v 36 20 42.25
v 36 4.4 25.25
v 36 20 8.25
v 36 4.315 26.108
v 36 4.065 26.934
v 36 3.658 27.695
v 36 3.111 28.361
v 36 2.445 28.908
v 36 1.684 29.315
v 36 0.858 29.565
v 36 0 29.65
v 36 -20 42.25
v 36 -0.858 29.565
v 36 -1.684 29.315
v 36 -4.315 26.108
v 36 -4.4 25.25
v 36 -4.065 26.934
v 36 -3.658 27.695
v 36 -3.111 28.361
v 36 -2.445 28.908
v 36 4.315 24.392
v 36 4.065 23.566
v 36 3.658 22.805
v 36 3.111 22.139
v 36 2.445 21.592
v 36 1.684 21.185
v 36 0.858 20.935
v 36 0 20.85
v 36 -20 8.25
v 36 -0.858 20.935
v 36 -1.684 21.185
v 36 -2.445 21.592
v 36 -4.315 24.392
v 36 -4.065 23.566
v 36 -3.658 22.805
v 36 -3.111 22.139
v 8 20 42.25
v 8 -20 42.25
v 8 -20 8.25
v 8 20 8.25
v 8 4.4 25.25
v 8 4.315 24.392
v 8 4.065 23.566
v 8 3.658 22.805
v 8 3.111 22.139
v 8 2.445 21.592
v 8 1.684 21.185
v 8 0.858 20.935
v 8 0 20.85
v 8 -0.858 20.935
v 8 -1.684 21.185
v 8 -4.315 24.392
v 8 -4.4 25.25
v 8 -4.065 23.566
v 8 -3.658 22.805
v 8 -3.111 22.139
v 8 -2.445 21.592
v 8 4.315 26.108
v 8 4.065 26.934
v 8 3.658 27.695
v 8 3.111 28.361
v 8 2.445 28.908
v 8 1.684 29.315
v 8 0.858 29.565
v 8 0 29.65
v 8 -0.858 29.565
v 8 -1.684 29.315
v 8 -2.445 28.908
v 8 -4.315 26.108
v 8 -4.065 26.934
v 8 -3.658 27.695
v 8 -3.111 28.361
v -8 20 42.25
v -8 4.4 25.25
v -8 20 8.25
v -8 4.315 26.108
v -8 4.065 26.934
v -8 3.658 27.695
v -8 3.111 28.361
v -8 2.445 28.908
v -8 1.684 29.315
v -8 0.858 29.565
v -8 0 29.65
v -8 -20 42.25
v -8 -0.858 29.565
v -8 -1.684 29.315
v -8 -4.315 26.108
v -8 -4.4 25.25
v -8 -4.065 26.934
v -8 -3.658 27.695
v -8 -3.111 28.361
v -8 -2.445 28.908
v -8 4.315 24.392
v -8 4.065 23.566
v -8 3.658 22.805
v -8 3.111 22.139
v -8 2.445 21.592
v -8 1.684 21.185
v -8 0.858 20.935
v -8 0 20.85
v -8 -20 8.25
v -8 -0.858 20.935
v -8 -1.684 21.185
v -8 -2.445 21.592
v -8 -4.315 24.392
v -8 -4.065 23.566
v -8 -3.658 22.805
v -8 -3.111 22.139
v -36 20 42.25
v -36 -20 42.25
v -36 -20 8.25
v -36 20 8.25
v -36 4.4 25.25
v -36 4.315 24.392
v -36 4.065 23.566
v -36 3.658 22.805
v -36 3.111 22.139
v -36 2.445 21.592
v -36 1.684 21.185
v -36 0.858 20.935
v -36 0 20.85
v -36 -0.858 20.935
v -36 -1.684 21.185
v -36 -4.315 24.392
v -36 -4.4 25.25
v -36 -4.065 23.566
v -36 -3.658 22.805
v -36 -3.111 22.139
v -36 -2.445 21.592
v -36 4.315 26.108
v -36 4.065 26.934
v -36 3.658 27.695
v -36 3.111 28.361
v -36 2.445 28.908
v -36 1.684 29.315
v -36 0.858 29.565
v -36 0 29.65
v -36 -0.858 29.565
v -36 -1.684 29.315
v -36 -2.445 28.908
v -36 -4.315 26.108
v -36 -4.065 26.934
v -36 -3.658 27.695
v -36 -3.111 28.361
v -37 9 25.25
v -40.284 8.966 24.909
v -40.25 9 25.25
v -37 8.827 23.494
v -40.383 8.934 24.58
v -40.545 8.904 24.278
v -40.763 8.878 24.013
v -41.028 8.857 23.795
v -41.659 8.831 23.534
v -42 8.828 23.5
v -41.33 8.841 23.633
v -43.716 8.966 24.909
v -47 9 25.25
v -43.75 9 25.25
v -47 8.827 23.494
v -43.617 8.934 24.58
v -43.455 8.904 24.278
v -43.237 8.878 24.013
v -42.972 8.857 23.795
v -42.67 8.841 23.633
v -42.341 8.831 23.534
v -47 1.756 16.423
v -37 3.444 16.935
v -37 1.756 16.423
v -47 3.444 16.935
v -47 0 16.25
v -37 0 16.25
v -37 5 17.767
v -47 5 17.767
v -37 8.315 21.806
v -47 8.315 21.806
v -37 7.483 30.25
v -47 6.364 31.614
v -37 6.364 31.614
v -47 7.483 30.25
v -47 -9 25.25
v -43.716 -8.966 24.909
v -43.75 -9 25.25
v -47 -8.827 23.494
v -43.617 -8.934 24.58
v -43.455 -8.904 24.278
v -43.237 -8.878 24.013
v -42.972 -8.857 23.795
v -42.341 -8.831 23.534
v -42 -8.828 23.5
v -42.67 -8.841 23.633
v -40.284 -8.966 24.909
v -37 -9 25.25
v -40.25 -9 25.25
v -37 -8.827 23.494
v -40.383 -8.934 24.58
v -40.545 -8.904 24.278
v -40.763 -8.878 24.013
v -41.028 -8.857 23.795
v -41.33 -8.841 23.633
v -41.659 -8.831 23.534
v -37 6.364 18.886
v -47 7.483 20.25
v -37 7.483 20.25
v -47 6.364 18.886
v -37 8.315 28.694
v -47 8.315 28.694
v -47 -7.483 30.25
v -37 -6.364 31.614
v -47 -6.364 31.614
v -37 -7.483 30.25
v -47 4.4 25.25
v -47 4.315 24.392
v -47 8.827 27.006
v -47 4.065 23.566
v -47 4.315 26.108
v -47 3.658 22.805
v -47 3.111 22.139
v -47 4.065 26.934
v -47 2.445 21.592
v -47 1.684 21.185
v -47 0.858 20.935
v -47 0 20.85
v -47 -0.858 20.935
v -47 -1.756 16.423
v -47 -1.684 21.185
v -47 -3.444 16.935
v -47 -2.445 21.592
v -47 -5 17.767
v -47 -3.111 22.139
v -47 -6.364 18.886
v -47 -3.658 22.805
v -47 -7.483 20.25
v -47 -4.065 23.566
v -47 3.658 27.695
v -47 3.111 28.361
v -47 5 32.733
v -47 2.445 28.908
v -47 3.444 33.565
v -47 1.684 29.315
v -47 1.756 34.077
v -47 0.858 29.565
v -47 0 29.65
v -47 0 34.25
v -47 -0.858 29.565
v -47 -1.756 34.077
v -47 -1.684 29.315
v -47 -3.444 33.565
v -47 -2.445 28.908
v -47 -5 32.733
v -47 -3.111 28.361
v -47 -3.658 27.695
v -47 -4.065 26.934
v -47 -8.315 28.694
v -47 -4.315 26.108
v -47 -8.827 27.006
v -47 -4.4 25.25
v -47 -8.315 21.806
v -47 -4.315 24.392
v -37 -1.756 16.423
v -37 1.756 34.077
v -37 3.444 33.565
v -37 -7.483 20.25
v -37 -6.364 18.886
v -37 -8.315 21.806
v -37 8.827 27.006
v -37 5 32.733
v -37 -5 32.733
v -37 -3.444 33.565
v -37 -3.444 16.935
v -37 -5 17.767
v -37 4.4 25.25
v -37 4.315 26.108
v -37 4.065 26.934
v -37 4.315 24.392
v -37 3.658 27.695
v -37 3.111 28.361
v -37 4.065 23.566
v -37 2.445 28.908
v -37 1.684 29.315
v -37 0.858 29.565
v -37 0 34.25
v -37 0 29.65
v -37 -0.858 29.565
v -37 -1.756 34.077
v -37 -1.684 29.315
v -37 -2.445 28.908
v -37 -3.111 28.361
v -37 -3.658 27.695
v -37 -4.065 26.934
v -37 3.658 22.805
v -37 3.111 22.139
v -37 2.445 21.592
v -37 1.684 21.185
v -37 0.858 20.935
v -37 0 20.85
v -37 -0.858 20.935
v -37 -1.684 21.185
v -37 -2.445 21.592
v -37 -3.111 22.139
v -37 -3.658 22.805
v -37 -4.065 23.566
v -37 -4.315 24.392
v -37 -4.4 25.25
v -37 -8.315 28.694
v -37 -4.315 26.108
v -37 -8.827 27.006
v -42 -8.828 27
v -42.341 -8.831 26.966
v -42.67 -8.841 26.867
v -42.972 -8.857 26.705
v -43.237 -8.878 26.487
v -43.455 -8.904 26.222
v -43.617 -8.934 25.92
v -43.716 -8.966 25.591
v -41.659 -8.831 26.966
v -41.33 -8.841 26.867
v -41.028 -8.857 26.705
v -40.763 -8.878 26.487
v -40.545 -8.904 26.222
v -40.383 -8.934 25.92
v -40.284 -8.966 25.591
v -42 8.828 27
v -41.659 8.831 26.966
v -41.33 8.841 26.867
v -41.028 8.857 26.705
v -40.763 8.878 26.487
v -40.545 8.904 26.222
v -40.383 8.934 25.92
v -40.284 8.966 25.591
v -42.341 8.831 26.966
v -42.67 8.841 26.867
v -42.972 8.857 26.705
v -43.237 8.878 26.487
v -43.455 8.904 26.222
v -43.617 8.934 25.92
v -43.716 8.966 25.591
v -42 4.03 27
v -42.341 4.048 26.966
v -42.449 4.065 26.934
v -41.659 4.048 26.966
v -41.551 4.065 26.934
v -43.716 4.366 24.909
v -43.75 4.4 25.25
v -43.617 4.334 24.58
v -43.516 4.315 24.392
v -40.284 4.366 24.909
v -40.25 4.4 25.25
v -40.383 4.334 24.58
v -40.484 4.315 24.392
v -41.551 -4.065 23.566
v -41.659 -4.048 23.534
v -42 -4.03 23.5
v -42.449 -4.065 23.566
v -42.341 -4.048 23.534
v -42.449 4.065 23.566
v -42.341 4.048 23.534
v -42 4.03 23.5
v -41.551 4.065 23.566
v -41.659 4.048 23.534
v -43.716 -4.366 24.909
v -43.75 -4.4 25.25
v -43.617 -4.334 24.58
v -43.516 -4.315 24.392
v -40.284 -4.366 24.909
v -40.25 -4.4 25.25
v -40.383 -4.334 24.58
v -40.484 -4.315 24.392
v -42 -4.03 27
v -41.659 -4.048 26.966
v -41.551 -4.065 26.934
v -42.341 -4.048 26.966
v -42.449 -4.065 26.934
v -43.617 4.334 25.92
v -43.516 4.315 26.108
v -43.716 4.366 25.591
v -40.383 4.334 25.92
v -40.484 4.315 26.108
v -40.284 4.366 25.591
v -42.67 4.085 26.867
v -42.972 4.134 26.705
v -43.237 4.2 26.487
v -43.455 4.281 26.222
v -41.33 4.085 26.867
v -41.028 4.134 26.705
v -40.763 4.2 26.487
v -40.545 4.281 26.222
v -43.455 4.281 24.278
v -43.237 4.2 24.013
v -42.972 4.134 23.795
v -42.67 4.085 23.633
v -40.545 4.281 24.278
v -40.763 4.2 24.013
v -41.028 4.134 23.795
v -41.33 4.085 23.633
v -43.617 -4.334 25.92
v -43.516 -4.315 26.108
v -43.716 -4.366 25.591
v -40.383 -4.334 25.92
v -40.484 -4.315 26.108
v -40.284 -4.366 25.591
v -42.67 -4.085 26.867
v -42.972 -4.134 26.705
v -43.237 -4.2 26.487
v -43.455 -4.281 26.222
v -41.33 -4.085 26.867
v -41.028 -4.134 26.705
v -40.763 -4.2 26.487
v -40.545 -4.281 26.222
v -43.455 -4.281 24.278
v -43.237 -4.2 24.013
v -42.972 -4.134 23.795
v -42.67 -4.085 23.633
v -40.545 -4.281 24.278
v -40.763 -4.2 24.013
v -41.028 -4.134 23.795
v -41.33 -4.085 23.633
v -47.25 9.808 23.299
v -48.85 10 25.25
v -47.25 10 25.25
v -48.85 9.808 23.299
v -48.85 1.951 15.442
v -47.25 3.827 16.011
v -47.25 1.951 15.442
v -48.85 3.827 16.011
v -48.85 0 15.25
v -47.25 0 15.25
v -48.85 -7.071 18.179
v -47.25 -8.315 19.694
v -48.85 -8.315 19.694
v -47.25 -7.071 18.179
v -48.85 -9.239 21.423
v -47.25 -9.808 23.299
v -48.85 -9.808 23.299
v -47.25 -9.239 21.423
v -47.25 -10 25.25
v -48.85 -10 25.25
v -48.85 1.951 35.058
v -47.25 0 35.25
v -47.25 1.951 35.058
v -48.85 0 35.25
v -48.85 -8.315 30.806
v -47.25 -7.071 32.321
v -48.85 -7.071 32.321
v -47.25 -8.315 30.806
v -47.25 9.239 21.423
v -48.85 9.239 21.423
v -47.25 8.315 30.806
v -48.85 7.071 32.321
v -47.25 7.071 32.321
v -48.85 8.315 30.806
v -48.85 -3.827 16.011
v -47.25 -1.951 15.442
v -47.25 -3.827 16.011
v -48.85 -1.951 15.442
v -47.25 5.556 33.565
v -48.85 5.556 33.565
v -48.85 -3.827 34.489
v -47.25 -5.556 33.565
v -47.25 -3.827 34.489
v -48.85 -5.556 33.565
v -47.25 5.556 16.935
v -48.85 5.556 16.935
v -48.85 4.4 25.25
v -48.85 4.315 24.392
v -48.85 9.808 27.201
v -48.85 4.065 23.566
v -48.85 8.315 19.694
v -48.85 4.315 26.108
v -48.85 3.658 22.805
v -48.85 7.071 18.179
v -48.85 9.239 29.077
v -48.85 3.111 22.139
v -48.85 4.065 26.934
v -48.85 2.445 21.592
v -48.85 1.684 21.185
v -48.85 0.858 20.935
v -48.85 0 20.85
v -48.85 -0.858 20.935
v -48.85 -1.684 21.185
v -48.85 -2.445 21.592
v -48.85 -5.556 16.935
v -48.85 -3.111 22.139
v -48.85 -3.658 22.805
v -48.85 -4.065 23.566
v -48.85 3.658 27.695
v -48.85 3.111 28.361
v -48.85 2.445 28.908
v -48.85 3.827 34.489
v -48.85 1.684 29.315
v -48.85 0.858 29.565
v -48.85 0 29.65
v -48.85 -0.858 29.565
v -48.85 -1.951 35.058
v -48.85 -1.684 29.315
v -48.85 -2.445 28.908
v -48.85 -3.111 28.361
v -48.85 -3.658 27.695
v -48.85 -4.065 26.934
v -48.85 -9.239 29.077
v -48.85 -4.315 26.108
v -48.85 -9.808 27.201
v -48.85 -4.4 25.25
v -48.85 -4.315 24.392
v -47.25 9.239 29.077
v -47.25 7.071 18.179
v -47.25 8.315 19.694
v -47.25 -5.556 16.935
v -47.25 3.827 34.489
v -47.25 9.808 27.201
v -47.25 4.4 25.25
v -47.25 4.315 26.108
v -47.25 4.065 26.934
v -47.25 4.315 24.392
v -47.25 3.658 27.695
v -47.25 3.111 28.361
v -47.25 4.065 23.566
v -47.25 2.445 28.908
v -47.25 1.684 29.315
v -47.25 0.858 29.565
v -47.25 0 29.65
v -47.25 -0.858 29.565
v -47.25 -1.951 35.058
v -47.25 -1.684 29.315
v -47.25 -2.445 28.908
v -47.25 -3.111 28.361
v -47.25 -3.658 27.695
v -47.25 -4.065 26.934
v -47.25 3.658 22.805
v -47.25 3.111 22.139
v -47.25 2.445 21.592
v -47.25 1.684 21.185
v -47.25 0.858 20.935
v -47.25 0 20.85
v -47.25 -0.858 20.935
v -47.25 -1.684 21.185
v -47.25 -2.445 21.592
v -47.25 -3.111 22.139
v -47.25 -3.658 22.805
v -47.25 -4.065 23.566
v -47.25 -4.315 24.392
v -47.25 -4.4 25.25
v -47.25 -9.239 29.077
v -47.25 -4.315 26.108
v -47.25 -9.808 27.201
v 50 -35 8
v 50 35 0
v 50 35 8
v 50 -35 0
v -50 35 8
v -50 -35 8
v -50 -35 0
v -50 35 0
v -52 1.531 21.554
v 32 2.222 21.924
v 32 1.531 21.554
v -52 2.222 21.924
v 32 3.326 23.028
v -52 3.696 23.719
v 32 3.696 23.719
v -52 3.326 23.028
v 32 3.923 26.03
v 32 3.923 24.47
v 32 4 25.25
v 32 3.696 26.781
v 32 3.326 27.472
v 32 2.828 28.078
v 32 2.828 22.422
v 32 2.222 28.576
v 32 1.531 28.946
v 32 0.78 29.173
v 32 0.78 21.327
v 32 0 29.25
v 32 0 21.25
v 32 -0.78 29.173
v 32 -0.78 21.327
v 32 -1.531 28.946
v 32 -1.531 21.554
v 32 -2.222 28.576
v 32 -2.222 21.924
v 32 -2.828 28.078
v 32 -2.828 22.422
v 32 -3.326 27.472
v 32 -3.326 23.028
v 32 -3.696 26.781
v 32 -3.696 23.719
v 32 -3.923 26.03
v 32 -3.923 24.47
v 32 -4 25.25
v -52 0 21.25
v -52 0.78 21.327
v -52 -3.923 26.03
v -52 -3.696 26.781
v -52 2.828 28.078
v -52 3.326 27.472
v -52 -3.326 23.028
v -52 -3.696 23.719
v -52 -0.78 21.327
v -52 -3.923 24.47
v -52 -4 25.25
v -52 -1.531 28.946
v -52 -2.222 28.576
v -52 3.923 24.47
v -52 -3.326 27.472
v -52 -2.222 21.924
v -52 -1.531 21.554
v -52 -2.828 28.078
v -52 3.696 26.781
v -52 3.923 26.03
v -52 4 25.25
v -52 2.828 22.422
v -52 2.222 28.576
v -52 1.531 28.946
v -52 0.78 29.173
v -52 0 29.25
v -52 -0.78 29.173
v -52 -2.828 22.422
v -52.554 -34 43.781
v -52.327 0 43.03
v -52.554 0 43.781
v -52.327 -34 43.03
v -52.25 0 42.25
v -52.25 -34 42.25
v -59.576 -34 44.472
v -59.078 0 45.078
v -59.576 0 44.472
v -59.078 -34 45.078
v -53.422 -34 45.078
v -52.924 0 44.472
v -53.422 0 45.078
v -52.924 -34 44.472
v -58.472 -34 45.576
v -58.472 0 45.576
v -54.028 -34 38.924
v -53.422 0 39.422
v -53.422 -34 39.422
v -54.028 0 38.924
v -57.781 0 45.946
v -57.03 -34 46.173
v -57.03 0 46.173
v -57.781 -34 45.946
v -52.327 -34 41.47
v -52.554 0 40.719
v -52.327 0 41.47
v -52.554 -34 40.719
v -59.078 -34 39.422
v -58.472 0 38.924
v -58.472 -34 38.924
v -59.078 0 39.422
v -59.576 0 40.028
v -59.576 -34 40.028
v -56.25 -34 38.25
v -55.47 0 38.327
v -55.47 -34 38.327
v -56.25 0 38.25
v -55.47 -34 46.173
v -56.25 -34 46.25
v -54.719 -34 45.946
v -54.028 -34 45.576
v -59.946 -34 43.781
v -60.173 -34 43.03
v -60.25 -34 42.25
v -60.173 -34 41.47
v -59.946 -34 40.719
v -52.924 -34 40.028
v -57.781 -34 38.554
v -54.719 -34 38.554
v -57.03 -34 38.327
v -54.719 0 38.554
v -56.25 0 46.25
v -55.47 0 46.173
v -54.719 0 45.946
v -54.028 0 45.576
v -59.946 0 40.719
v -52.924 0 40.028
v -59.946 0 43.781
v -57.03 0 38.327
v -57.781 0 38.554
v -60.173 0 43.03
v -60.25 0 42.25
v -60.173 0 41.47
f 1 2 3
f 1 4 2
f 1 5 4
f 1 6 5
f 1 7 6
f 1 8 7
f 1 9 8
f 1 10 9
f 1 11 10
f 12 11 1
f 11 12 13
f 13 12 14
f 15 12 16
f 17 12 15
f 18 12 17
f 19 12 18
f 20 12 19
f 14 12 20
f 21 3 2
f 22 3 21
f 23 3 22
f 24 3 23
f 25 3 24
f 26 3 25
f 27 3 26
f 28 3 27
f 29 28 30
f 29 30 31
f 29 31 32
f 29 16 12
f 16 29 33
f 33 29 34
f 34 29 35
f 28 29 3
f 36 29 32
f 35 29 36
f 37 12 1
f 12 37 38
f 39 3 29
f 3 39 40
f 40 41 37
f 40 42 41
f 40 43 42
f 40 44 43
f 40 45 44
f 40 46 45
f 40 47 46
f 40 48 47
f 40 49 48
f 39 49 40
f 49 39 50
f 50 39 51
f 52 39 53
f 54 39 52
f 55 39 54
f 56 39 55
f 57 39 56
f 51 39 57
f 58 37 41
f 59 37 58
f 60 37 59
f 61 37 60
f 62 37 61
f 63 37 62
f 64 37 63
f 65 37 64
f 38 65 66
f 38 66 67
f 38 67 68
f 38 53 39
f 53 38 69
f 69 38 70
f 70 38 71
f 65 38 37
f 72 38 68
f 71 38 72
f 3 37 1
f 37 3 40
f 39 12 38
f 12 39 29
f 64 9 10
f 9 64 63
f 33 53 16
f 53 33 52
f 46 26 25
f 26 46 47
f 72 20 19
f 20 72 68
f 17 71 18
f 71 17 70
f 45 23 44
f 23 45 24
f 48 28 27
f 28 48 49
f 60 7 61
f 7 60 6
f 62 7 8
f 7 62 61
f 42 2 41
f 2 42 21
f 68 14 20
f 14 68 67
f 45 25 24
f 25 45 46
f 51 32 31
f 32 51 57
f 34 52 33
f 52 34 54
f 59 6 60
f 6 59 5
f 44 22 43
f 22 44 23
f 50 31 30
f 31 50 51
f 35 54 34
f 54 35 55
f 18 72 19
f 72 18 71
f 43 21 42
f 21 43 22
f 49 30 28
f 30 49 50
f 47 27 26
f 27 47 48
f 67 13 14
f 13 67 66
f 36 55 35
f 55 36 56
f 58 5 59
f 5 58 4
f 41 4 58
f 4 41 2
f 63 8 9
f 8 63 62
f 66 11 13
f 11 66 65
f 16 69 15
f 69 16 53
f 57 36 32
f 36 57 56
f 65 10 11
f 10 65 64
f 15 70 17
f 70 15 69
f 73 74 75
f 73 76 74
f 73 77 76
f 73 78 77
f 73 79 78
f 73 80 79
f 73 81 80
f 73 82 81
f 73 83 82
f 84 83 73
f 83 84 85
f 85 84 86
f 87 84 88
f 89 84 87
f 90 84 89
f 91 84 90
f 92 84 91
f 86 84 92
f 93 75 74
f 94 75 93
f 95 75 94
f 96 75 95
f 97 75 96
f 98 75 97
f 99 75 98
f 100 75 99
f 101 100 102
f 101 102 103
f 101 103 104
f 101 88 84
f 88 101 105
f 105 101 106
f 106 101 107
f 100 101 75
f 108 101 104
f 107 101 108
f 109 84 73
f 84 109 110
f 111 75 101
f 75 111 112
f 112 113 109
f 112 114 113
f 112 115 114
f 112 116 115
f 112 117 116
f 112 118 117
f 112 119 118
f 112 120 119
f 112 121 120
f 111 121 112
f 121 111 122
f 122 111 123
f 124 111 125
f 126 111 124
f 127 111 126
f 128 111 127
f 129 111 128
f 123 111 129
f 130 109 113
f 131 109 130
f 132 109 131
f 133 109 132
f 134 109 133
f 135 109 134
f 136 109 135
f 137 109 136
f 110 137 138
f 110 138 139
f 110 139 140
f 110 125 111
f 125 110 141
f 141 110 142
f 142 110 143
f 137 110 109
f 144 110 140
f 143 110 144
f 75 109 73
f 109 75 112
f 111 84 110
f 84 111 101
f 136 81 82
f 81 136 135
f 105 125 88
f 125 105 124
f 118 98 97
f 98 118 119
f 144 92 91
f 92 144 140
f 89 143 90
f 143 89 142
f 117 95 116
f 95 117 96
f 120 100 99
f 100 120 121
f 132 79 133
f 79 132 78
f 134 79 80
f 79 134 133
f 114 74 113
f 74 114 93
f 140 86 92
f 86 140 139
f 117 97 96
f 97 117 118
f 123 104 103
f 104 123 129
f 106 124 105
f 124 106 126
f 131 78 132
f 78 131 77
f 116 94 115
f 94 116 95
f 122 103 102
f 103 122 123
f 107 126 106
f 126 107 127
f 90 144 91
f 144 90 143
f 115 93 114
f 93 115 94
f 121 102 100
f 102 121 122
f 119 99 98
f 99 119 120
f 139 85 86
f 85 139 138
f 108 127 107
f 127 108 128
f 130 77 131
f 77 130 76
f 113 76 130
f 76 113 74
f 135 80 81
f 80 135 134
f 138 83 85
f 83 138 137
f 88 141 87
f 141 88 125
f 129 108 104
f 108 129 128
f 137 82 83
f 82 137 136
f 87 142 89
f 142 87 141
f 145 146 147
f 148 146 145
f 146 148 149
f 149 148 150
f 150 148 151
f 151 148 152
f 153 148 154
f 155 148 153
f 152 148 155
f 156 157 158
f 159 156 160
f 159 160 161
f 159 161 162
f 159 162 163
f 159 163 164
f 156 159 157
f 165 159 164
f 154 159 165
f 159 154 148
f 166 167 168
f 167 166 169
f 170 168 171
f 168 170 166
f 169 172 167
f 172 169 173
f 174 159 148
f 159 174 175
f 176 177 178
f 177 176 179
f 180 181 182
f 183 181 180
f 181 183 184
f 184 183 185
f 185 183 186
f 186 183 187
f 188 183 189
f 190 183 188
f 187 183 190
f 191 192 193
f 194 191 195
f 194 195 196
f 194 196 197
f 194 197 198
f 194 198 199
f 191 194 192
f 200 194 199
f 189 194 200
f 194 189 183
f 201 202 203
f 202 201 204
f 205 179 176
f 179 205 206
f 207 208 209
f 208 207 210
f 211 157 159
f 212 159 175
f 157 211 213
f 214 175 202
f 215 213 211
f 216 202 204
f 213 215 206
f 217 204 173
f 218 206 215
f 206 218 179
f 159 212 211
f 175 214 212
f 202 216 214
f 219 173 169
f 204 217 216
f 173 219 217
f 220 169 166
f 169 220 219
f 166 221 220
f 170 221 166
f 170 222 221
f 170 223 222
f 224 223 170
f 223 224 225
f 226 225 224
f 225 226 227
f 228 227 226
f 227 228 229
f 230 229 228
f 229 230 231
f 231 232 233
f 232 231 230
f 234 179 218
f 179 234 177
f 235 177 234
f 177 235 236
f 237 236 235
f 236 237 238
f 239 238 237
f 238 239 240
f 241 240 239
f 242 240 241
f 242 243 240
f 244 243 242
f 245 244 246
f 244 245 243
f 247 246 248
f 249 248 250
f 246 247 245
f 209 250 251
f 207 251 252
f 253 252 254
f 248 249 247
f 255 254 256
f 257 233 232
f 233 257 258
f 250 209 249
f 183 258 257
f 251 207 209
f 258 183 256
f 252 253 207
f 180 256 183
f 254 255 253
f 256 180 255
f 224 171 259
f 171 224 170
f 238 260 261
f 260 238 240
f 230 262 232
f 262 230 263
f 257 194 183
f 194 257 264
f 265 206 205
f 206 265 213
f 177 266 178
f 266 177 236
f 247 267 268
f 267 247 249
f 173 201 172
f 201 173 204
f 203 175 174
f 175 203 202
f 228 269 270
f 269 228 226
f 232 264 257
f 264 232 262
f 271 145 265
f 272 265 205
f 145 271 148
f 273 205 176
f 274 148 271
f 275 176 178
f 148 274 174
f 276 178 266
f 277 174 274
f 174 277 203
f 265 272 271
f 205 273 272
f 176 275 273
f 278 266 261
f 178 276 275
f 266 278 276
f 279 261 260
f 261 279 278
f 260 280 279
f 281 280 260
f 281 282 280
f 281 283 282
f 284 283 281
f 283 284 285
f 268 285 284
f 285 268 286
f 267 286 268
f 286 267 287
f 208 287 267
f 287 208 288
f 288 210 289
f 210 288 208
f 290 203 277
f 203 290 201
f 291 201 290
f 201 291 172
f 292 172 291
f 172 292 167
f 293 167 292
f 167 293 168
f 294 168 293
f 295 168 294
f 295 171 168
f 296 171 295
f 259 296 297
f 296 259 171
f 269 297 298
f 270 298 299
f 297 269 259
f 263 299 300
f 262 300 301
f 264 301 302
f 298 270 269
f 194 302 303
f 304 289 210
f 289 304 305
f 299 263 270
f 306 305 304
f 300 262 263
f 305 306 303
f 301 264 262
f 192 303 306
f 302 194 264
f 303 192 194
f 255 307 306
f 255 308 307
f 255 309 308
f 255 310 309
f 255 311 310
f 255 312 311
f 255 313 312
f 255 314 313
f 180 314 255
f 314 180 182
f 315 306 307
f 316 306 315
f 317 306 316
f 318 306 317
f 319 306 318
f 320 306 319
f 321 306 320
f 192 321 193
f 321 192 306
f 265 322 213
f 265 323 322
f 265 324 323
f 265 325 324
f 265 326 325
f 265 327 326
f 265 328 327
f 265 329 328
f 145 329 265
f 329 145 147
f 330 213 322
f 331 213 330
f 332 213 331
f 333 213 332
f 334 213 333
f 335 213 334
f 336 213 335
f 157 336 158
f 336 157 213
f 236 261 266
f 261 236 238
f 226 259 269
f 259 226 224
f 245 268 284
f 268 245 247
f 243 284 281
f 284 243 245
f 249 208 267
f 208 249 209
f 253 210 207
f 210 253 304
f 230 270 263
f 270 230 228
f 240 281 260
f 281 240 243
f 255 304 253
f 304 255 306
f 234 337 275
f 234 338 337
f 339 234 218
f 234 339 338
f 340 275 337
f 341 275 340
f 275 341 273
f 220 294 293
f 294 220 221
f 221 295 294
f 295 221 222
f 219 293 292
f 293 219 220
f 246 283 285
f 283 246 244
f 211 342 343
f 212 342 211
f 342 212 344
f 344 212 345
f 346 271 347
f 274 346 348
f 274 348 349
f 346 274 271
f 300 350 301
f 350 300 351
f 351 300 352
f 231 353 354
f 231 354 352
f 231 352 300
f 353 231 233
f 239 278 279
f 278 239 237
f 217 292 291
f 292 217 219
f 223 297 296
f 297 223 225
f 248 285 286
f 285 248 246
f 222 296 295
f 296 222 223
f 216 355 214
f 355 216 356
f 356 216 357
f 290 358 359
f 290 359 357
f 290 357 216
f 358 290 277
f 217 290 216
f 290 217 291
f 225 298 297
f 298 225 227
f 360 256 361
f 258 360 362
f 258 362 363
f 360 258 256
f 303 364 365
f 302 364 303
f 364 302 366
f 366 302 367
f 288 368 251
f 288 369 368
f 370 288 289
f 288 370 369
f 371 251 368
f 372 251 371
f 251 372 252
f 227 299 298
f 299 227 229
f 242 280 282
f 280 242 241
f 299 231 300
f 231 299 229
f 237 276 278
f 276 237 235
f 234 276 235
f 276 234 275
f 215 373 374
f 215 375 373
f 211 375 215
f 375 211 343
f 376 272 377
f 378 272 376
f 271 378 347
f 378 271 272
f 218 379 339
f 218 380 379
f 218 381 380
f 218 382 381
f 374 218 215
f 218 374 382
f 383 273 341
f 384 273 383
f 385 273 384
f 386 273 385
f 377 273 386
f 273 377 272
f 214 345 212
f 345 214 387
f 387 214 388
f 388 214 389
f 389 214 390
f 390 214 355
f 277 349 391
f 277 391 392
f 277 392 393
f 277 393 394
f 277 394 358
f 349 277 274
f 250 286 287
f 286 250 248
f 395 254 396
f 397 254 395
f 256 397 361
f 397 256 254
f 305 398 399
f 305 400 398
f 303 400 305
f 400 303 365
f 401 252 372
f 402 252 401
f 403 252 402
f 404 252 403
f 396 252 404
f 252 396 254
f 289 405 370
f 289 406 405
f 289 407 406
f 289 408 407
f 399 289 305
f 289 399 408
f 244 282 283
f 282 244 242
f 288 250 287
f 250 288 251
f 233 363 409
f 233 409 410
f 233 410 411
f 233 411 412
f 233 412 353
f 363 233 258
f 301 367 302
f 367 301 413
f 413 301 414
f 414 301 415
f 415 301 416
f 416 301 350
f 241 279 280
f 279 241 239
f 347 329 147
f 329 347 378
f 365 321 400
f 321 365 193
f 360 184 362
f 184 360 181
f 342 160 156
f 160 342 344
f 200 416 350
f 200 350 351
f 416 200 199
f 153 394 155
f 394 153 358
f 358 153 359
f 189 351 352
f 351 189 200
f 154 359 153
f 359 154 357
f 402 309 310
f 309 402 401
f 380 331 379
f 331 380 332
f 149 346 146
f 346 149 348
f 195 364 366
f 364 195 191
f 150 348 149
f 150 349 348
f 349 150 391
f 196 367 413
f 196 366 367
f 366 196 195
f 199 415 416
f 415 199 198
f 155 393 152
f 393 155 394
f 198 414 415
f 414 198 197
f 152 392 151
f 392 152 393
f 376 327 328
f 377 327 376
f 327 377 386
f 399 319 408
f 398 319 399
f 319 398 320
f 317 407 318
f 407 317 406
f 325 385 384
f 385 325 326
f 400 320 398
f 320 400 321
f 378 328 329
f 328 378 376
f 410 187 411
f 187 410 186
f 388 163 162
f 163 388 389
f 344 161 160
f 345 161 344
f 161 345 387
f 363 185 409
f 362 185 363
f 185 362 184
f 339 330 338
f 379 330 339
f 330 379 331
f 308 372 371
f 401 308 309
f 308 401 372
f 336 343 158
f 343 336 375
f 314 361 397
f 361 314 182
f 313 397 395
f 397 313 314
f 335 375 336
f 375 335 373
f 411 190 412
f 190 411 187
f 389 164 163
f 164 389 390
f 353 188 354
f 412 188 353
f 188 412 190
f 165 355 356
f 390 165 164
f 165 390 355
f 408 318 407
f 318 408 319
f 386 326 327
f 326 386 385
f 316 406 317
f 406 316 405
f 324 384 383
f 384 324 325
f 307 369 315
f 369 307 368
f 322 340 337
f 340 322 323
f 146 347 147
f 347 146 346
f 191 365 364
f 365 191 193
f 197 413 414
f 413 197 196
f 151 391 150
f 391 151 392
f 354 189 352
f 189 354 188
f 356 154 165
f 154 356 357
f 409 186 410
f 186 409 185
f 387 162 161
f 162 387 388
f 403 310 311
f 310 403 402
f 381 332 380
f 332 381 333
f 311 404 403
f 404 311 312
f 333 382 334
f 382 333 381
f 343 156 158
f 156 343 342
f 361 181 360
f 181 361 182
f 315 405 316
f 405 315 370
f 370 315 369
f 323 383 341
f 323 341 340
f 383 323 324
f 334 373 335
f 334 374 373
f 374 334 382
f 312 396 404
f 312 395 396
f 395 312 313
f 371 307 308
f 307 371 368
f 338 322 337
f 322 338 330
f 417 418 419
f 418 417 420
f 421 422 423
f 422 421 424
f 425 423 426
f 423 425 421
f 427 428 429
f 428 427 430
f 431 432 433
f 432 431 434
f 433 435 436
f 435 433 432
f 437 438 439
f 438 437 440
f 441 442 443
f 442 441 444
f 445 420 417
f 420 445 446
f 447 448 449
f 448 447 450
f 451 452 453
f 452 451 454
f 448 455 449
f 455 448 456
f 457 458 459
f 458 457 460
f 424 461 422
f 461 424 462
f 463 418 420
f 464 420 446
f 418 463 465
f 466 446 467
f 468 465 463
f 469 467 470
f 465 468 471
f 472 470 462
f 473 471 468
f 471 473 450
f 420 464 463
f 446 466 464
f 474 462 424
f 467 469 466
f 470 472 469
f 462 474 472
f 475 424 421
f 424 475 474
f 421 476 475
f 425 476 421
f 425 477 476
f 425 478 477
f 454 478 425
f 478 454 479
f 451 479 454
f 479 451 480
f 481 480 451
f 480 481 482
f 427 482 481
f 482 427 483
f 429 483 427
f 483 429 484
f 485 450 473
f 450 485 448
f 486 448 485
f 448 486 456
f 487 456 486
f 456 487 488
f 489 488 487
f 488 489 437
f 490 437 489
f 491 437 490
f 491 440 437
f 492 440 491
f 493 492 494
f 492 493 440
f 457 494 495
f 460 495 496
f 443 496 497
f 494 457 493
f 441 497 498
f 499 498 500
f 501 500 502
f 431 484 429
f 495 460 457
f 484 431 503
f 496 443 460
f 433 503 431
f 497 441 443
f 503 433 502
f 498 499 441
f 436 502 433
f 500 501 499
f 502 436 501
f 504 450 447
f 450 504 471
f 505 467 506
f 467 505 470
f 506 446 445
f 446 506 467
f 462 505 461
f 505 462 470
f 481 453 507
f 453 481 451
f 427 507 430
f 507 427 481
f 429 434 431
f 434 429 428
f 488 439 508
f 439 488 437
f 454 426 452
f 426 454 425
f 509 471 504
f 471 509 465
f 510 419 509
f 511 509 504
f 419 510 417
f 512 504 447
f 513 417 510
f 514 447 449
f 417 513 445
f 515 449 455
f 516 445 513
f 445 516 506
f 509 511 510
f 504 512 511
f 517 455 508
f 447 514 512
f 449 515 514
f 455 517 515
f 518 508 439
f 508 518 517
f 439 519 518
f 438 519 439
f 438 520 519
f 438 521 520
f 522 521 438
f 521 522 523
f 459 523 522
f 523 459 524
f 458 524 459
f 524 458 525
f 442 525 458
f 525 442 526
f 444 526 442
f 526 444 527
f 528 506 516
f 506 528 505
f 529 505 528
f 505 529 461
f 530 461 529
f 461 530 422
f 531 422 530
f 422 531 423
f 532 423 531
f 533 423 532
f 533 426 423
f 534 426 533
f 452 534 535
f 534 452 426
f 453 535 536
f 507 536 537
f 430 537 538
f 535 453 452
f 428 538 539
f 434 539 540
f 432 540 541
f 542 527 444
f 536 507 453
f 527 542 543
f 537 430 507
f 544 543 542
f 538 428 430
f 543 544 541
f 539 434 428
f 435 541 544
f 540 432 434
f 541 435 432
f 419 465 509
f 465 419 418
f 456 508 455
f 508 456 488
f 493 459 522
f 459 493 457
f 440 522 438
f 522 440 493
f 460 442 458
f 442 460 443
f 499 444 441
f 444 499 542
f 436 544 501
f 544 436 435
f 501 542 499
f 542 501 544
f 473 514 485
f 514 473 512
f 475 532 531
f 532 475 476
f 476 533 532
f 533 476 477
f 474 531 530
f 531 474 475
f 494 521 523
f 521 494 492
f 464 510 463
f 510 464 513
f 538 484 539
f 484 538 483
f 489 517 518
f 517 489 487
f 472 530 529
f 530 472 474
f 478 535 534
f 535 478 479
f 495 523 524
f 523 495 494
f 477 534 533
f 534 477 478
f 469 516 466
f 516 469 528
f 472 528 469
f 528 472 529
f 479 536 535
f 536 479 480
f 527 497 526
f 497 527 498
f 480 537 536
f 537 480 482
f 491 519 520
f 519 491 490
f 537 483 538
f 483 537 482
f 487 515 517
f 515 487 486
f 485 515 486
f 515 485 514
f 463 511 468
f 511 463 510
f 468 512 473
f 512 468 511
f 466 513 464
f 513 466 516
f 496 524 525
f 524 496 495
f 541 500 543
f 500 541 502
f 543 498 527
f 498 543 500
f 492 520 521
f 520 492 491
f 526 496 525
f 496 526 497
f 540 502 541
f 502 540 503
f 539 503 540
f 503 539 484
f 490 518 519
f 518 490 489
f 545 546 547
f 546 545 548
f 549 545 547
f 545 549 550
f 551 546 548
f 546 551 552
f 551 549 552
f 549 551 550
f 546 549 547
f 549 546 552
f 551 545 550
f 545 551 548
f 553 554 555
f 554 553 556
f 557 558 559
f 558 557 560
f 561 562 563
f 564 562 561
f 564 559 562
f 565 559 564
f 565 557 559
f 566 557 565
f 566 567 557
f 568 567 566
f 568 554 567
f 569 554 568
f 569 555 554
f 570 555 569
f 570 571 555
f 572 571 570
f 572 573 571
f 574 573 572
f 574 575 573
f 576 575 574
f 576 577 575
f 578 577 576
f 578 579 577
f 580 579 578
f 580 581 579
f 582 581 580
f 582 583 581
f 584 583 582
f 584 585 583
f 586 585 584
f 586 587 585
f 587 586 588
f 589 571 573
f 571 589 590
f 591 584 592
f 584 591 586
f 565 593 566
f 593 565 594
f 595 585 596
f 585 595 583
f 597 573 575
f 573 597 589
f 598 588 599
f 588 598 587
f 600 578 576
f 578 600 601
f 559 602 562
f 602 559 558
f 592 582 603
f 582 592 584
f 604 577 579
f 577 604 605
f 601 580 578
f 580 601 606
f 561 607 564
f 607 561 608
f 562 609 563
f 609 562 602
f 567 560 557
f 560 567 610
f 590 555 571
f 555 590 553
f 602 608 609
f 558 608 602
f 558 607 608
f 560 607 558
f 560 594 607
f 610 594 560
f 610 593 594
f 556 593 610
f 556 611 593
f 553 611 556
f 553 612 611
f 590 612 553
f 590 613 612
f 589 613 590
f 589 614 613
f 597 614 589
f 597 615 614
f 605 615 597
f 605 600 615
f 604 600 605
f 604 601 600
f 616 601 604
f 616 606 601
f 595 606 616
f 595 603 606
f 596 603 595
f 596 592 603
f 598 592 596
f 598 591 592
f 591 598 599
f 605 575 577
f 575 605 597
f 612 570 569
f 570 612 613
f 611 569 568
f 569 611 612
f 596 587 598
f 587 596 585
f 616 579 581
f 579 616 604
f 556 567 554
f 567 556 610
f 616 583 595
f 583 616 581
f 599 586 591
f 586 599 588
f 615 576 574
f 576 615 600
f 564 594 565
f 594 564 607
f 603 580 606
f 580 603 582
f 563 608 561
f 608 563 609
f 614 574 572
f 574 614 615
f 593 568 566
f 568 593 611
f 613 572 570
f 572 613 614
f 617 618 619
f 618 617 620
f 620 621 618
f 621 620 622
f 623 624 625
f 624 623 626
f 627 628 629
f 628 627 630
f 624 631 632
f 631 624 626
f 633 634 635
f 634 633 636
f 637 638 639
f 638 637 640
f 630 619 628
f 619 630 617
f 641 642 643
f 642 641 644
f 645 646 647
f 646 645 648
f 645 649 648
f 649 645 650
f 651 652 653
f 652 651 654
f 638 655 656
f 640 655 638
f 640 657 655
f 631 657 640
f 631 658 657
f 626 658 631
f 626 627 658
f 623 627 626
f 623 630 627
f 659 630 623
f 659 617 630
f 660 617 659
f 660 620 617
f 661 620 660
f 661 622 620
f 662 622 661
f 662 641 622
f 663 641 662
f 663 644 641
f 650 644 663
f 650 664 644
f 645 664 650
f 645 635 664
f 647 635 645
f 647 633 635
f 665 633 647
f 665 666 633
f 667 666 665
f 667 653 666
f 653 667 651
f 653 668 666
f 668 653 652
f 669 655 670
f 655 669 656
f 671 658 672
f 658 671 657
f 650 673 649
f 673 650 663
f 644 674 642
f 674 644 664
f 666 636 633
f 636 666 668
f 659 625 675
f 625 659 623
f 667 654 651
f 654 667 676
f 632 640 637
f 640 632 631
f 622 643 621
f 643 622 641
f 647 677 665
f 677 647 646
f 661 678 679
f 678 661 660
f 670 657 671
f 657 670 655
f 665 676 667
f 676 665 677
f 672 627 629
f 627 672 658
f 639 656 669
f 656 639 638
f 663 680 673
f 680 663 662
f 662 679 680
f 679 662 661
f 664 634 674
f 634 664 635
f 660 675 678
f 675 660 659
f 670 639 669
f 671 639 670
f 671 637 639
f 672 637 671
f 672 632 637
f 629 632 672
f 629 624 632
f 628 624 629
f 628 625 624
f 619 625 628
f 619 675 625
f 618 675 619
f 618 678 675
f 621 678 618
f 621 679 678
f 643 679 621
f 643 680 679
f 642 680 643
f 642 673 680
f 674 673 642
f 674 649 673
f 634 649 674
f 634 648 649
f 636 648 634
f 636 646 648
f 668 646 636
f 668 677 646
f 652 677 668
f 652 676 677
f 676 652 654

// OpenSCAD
$fn = 32;

// ------------------------------------------------------------------------
// Machine vise: screw d8, jaws 28 x 34 mm
// Every part is its own module, assembly() places every instance.
// ------------------------------------------------------------------------

// --- part 1 ---
module vise_bed() {
  difference() {
    translate([-50, -35, 0]) cube([100, 70, 8]);
  }
}

// --- part 2 ---
module vise_jaw() {
  difference() {
    translate([-14, -20, 0]) cube([28, 40, 34]);
    translate([0, 0, 17]) rotate([0, 90, 0]) cylinder(h = 30, d = 8.8, center = true);
  }
}

// --- part 3 ---
module vise_screw() {
  translate([0, 0, -42]) cylinder(h = 84, d = 8);
}

// --- part 4 ---
module screw_collar() {
  difference() {
    cylinder(h = 10, d = 18);
    translate([0, 0, -1]) cylinder(h = 12, d = 8.8);
    translate([0, 0, 5]) rotate([90, 0, 0]) cylinder(h = 20, d = 3.5, center = true);
  }
}

// --- part 5 ---
module screw_washer() {
  difference() {
      translate([0, 0, 0]) cylinder(h = 1.6, d = 20);
      translate([0, 0, -1]) cylinder(h = 3.6, d = 8.8);
    }
}

// --- part 6 ---
module vise_handle() {
  cylinder(h = 34, d = 8);
}

// --- assembly ---
module assembly() {
  color([0.80, 0.24, 0.20]) translate([0, 0, 0]) rotate([0, 0, 0]) vise_bed();
  color([0.20, 0.45, 0.75]) translate([22, 0, 8.25]) rotate([0, 0, 0]) vise_jaw();
  color([0.25, 0.62, 0.32]) translate([-22, 0, 8.25]) rotate([0, 0, 0]) vise_jaw();
  color([0.92, 0.70, 0.18]) translate([-10, 0, 25.25]) rotate([0, 90, 0]) vise_screw();
  color([0.58, 0.35, 0.70]) translate([-47, 0, 25.25]) rotate([0, 90, 0]) screw_collar();
  color([0.16, 0.66, 0.66]) translate([-48.85, 0, 25.25]) rotate([0, 90, 0]) screw_washer();
  color([0.85, 0.48, 0.18]) translate([-56.25, 0, 42.25]) rotate([90, 0, 0]) vise_handle();
}

assembly();
